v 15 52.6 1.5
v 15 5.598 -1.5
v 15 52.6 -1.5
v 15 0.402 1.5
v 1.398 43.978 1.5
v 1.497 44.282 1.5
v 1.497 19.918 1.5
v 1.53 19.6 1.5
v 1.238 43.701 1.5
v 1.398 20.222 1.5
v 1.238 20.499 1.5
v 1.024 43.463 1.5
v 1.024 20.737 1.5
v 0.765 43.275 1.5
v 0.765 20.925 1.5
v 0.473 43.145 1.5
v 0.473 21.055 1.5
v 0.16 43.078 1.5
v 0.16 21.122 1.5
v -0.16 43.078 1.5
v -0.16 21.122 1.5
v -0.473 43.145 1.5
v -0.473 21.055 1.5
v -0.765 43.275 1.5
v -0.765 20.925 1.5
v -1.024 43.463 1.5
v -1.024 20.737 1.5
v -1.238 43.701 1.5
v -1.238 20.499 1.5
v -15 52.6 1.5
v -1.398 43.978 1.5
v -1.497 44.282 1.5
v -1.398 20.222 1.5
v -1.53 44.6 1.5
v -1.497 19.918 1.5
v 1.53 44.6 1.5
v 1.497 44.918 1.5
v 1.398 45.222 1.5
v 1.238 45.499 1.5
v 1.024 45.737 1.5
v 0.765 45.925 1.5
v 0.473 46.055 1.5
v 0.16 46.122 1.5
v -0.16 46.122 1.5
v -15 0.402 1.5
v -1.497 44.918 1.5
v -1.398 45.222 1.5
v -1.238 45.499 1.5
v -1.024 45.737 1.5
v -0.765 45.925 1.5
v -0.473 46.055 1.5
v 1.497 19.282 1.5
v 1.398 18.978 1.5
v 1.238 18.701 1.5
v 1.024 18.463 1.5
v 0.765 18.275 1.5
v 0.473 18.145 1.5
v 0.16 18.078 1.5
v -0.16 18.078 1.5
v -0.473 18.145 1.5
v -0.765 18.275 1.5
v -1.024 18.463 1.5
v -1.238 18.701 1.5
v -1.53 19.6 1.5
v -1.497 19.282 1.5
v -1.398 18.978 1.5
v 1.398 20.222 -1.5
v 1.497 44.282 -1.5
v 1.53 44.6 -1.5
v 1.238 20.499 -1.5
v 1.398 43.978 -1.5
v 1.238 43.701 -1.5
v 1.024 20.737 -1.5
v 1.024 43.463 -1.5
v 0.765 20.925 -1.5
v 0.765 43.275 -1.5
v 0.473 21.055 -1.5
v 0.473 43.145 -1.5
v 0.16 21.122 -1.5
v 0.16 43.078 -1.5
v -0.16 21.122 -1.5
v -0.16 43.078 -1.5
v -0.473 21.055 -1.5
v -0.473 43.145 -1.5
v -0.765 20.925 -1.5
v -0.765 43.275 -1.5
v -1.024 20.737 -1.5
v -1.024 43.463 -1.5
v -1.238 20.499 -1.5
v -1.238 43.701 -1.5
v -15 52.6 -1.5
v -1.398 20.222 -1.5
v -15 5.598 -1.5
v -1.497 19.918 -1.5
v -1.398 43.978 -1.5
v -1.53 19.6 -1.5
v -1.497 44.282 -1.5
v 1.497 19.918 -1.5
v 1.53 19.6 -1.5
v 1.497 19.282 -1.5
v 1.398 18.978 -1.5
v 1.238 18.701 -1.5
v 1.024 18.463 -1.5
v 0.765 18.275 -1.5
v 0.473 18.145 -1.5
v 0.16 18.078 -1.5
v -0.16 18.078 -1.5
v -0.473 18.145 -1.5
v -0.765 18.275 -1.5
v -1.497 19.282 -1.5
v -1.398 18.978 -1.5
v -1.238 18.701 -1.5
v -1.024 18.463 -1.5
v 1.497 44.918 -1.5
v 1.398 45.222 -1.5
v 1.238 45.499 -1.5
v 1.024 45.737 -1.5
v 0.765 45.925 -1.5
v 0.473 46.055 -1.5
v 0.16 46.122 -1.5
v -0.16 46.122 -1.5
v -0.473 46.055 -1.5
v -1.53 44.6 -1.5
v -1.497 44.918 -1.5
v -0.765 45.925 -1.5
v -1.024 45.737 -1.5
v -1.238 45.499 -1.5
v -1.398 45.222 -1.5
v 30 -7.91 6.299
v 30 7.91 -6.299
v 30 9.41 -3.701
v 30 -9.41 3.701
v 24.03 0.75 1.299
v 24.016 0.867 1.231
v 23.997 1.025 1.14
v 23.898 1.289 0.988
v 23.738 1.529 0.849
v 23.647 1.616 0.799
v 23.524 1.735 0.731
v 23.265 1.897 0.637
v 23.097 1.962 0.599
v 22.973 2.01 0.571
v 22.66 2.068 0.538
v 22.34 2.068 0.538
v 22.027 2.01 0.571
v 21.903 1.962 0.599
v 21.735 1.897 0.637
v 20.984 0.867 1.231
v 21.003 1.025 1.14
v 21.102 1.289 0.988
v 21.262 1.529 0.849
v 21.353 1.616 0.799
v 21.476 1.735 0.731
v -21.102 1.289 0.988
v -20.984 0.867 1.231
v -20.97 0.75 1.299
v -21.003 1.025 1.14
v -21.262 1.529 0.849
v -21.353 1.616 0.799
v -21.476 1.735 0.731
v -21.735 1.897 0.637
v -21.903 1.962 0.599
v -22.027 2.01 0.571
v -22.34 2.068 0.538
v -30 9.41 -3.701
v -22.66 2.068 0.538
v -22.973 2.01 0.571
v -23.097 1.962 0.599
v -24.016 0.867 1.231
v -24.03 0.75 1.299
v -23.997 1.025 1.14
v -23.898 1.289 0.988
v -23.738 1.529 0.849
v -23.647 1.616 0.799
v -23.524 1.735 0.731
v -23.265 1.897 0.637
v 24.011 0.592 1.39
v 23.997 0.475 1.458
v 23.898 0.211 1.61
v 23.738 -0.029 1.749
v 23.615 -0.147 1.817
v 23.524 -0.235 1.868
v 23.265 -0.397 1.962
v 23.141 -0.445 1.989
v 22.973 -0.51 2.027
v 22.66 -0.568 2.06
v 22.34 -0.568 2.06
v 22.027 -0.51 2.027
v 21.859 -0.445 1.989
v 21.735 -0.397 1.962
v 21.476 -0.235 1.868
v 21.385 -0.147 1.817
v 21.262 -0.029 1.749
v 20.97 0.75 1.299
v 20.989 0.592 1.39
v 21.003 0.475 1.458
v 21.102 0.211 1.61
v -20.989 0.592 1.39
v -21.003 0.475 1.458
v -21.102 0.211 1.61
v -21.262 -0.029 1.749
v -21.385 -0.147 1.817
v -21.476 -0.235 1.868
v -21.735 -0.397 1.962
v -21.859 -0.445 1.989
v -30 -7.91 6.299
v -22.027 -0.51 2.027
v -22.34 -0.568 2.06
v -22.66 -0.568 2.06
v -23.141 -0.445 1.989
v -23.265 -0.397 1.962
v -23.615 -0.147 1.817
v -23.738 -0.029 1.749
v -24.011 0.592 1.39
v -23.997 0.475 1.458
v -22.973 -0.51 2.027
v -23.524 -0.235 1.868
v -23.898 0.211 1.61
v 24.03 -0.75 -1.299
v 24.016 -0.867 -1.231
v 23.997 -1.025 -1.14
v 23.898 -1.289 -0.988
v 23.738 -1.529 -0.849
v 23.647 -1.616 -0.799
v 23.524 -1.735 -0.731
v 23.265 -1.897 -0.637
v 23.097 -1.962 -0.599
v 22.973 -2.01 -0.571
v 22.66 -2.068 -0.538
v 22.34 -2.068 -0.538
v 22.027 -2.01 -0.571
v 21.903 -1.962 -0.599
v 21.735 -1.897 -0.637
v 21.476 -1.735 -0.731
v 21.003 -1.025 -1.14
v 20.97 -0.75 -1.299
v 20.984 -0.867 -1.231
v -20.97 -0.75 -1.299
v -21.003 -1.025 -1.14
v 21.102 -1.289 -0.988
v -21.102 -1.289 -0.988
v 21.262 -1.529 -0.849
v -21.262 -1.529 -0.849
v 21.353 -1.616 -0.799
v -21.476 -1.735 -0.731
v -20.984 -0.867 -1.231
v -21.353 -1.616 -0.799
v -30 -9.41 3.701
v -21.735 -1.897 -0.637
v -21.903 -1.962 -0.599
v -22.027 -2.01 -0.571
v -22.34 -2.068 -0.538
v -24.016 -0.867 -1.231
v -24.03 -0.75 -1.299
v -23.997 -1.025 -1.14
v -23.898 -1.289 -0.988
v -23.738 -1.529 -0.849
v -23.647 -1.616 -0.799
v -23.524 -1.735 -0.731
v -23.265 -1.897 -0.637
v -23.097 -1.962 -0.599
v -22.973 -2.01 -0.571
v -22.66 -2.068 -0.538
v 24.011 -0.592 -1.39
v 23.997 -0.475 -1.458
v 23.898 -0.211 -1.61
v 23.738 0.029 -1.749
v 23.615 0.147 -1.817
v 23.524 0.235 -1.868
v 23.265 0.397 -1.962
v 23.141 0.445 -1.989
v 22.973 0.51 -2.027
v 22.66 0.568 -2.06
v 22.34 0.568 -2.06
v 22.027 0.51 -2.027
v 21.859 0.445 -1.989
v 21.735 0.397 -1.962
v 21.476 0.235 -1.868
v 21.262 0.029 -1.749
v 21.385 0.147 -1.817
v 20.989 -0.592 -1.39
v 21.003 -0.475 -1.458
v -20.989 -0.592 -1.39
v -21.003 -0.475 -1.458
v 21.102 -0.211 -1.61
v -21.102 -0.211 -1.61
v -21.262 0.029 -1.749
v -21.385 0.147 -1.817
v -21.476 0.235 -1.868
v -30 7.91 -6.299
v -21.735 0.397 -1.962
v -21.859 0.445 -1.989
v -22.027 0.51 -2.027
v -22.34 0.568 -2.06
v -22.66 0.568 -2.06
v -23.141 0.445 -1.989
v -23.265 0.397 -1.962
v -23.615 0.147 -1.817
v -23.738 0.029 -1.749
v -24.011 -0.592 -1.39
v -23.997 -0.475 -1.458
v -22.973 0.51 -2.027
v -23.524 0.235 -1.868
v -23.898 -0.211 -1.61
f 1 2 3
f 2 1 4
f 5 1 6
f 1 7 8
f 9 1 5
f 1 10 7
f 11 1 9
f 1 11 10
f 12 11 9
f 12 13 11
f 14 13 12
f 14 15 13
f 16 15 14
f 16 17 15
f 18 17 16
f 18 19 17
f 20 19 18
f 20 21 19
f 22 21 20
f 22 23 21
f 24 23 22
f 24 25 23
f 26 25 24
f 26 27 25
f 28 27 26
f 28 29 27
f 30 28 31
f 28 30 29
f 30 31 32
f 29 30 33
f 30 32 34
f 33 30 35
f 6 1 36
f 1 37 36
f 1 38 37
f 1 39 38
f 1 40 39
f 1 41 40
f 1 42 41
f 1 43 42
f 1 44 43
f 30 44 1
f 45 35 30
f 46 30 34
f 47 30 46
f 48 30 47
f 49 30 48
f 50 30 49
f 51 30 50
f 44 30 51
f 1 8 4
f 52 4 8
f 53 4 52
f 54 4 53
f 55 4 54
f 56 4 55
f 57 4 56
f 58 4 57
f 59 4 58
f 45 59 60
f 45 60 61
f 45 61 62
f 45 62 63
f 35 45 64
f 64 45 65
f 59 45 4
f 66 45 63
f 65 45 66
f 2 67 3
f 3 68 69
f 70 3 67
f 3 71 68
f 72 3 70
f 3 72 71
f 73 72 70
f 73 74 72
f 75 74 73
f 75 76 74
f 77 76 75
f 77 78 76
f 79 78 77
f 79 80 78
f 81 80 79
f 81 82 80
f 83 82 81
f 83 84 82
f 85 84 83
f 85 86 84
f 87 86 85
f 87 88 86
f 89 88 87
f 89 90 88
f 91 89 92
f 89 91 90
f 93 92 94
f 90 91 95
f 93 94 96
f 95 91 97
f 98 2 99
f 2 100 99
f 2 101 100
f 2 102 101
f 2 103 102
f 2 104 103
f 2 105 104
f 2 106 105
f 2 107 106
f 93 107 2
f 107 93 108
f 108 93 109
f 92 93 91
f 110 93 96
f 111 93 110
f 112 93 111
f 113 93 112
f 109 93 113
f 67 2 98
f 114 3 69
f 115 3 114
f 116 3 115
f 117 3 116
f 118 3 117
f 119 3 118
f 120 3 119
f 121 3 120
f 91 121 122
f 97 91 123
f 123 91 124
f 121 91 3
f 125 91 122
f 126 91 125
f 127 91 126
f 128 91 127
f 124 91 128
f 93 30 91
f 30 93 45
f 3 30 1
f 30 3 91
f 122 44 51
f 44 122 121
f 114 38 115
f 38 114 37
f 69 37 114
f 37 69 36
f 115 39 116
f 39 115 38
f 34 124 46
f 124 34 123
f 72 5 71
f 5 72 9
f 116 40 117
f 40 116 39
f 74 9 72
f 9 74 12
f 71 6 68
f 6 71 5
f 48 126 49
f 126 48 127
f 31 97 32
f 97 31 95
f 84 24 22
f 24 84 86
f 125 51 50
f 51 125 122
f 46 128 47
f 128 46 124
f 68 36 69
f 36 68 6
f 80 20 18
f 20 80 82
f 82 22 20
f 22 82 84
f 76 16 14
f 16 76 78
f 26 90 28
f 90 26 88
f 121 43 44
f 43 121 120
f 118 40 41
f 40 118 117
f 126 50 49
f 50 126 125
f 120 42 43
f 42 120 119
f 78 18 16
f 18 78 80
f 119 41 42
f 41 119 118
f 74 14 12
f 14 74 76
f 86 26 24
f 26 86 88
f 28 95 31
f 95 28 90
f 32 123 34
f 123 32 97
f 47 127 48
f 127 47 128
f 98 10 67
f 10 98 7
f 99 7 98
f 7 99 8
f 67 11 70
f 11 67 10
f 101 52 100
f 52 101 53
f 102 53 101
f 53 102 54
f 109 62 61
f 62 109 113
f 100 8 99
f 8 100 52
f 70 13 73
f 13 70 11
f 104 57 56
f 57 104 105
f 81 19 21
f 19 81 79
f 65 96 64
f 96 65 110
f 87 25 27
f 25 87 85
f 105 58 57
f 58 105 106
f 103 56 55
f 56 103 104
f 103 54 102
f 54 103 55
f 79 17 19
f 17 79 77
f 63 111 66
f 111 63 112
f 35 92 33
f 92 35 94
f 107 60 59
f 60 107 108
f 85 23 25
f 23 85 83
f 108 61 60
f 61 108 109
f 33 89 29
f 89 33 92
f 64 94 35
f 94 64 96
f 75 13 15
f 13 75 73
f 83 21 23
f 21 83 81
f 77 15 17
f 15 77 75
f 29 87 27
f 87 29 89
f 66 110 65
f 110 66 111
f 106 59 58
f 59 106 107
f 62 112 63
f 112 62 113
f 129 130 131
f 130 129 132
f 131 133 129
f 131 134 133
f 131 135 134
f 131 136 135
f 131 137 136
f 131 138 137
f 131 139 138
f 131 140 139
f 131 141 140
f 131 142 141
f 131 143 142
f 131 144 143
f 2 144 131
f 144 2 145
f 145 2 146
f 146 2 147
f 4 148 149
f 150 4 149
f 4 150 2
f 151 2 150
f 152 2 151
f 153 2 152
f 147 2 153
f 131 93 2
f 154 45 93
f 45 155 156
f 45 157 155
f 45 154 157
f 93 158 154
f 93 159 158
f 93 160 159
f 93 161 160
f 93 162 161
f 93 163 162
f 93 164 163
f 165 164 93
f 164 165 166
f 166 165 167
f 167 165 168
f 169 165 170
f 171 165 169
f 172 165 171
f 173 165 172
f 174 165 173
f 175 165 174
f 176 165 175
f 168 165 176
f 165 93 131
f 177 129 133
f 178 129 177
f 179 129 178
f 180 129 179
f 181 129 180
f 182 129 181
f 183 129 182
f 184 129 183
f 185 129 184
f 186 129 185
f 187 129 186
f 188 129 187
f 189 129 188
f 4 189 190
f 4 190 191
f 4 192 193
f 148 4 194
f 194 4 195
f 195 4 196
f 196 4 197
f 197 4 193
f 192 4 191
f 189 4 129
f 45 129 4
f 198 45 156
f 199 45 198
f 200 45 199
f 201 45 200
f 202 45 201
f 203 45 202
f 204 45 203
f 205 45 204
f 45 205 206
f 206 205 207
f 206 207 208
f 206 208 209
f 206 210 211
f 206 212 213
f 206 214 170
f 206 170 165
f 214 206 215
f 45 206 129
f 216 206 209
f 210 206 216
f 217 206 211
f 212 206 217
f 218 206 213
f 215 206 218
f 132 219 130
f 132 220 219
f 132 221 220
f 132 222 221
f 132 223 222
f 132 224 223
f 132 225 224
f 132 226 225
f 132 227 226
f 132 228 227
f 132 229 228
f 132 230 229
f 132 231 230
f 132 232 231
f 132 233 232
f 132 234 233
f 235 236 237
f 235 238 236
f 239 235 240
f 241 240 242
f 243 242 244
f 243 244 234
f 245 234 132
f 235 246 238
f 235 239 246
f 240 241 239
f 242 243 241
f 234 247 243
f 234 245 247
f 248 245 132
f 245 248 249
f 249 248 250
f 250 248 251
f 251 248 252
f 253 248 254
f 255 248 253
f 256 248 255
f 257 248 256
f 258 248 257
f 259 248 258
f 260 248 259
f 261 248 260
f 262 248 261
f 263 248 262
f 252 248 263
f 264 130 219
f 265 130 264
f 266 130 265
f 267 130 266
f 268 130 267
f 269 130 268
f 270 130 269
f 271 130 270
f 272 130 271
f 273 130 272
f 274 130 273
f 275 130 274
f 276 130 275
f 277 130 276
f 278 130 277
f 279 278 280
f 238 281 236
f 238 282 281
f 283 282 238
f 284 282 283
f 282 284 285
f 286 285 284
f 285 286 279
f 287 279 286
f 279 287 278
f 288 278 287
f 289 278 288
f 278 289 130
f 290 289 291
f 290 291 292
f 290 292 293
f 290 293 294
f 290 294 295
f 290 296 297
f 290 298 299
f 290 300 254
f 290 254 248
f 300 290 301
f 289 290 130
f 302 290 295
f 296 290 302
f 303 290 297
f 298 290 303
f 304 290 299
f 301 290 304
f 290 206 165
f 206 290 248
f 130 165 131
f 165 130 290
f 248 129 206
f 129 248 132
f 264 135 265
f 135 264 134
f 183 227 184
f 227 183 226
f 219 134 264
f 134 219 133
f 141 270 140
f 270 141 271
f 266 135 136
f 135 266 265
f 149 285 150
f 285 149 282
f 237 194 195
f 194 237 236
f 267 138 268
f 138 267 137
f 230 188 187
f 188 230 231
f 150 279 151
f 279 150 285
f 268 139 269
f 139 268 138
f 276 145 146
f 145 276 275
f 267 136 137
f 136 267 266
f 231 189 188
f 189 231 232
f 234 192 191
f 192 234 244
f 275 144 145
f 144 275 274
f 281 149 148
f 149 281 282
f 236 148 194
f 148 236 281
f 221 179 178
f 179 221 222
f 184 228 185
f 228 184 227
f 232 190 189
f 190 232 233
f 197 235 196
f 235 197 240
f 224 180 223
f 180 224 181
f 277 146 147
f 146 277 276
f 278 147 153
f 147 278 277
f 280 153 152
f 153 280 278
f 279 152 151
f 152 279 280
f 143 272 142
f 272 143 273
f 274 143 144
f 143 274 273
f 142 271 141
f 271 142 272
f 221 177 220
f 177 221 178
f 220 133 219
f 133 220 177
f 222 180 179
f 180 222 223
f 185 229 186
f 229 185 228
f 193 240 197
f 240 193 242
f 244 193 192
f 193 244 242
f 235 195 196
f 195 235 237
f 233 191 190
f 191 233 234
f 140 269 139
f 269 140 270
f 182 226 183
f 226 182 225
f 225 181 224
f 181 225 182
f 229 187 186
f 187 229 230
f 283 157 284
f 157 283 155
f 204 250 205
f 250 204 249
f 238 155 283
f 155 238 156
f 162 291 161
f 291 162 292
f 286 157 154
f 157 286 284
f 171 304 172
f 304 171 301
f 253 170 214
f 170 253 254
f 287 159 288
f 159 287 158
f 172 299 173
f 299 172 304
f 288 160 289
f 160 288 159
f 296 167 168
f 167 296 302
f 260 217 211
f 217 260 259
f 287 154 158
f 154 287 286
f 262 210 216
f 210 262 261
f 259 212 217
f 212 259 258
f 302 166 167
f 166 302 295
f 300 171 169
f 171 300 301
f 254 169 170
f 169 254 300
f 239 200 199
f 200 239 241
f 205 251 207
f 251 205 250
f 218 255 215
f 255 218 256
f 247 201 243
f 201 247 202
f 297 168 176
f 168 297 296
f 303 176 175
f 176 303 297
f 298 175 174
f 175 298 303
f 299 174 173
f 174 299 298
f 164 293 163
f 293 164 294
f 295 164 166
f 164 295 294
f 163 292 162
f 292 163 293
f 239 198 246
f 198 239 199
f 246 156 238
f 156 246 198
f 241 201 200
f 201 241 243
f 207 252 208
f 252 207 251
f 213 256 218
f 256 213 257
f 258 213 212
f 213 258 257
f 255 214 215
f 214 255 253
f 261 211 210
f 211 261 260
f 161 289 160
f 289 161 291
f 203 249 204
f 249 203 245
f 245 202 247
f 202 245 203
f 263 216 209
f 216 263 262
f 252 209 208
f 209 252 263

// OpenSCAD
module camera_mount() {
  cam_angle = 60.0;
  over_hang_holes_w = 34.0;
  bottom_hang_holes_w = 25.0;
  rs_mount_holes_w = 45.0;

  mount_w = 30.0;
  mount_l = 53.0;
  mount_thickness = 3.0;

  tolerance = 1.02;
  mount_screw_size = 3.0;
  mount_screw_safe_size = mount_screw_size * tolerance;
  cam_mount_buffer_size = mount_screw_safe_size * 1.6;

  union() {
    // Mount body
    translate([0.0, 26.1, 0.0])
    difference() {
      cube([mount_w, mount_l, mount_thickness], center=true);

      // Mount holes
      translate([0.0, 6.0, 0.0])
        translate([0.0, bottom_hang_holes_w / 2.0, 0.0])
          cylinder(r=mount_screw_safe_size/2, h=20, center=true);

      translate([0.0, 6.0, 0.0])
        translate([0.0, -bottom_hang_holes_w / 2.0, 0.0])
          cylinder(r=mount_screw_safe_size/2, h=20, center=true);
    }

    // Camera bracket body
    difference() {
      rotate([-90.0 + cam_angle, 0.0, 0.0])
        cube([60, 20, mount_thickness], center=true);

      // Mount holes
      rotate([-90.0 + cam_angle, 0.0, 0.0])
        translate([rs_mount_holes_w / 2.0, 0.0, 0.0])
          cylinder(r=mount_screw_safe_size/2, h=20, center=true);

      rotate([-90.0 + cam_angle, 0.0, 0.0])
        translate([-rs_mount_holes_w / 2.0, 0.0, 0.0])
          cylinder(r=mount_screw_safe_size/2, h=20, center=true);
    }

    // // Mount hole buffer
    // difference() {
    //   rotate([-90.0 + cam_angle, 0.0, 0.0])
    //     translate([-rs_mount_holes_w / 2.0, 0.0, mount_thickness / 2 + 1])
    //       cylinder(r=cam_mount_buffer_size / 2, h=2, center=true);
    //
    //   rotate([-90.0 + cam_angle, 0.0, 0.0])
    //     translate([-rs_mount_holes_w / 2.0, 0.0, mount_thickness / 2 + 1])
    //       cylinder(r=mount_screw_safe_size / 2, h=2, center=true);
    // }
    // difference() {
    //   rotate([-90.0 + cam_angle, 0.0, 0.0])
    //     translate([rs_mount_holes_w / 2.0, 0.0, mount_thickness / 2 + 1])
    //       cylinder(r=cam_mount_buffer_size / 2, h=2, center=true);
    //
    //   rotate([-90.0 + cam_angle, 0.0, 0.0])
    //     translate([rs_mount_holes_w / 2.0, 0.0, mount_thickness / 2 + 1])
    //       cylinder(r=mount_screw_safe_size / 2, h=2, center=true);
    // }
  }
}

$fn = 30;
camera_mount();
